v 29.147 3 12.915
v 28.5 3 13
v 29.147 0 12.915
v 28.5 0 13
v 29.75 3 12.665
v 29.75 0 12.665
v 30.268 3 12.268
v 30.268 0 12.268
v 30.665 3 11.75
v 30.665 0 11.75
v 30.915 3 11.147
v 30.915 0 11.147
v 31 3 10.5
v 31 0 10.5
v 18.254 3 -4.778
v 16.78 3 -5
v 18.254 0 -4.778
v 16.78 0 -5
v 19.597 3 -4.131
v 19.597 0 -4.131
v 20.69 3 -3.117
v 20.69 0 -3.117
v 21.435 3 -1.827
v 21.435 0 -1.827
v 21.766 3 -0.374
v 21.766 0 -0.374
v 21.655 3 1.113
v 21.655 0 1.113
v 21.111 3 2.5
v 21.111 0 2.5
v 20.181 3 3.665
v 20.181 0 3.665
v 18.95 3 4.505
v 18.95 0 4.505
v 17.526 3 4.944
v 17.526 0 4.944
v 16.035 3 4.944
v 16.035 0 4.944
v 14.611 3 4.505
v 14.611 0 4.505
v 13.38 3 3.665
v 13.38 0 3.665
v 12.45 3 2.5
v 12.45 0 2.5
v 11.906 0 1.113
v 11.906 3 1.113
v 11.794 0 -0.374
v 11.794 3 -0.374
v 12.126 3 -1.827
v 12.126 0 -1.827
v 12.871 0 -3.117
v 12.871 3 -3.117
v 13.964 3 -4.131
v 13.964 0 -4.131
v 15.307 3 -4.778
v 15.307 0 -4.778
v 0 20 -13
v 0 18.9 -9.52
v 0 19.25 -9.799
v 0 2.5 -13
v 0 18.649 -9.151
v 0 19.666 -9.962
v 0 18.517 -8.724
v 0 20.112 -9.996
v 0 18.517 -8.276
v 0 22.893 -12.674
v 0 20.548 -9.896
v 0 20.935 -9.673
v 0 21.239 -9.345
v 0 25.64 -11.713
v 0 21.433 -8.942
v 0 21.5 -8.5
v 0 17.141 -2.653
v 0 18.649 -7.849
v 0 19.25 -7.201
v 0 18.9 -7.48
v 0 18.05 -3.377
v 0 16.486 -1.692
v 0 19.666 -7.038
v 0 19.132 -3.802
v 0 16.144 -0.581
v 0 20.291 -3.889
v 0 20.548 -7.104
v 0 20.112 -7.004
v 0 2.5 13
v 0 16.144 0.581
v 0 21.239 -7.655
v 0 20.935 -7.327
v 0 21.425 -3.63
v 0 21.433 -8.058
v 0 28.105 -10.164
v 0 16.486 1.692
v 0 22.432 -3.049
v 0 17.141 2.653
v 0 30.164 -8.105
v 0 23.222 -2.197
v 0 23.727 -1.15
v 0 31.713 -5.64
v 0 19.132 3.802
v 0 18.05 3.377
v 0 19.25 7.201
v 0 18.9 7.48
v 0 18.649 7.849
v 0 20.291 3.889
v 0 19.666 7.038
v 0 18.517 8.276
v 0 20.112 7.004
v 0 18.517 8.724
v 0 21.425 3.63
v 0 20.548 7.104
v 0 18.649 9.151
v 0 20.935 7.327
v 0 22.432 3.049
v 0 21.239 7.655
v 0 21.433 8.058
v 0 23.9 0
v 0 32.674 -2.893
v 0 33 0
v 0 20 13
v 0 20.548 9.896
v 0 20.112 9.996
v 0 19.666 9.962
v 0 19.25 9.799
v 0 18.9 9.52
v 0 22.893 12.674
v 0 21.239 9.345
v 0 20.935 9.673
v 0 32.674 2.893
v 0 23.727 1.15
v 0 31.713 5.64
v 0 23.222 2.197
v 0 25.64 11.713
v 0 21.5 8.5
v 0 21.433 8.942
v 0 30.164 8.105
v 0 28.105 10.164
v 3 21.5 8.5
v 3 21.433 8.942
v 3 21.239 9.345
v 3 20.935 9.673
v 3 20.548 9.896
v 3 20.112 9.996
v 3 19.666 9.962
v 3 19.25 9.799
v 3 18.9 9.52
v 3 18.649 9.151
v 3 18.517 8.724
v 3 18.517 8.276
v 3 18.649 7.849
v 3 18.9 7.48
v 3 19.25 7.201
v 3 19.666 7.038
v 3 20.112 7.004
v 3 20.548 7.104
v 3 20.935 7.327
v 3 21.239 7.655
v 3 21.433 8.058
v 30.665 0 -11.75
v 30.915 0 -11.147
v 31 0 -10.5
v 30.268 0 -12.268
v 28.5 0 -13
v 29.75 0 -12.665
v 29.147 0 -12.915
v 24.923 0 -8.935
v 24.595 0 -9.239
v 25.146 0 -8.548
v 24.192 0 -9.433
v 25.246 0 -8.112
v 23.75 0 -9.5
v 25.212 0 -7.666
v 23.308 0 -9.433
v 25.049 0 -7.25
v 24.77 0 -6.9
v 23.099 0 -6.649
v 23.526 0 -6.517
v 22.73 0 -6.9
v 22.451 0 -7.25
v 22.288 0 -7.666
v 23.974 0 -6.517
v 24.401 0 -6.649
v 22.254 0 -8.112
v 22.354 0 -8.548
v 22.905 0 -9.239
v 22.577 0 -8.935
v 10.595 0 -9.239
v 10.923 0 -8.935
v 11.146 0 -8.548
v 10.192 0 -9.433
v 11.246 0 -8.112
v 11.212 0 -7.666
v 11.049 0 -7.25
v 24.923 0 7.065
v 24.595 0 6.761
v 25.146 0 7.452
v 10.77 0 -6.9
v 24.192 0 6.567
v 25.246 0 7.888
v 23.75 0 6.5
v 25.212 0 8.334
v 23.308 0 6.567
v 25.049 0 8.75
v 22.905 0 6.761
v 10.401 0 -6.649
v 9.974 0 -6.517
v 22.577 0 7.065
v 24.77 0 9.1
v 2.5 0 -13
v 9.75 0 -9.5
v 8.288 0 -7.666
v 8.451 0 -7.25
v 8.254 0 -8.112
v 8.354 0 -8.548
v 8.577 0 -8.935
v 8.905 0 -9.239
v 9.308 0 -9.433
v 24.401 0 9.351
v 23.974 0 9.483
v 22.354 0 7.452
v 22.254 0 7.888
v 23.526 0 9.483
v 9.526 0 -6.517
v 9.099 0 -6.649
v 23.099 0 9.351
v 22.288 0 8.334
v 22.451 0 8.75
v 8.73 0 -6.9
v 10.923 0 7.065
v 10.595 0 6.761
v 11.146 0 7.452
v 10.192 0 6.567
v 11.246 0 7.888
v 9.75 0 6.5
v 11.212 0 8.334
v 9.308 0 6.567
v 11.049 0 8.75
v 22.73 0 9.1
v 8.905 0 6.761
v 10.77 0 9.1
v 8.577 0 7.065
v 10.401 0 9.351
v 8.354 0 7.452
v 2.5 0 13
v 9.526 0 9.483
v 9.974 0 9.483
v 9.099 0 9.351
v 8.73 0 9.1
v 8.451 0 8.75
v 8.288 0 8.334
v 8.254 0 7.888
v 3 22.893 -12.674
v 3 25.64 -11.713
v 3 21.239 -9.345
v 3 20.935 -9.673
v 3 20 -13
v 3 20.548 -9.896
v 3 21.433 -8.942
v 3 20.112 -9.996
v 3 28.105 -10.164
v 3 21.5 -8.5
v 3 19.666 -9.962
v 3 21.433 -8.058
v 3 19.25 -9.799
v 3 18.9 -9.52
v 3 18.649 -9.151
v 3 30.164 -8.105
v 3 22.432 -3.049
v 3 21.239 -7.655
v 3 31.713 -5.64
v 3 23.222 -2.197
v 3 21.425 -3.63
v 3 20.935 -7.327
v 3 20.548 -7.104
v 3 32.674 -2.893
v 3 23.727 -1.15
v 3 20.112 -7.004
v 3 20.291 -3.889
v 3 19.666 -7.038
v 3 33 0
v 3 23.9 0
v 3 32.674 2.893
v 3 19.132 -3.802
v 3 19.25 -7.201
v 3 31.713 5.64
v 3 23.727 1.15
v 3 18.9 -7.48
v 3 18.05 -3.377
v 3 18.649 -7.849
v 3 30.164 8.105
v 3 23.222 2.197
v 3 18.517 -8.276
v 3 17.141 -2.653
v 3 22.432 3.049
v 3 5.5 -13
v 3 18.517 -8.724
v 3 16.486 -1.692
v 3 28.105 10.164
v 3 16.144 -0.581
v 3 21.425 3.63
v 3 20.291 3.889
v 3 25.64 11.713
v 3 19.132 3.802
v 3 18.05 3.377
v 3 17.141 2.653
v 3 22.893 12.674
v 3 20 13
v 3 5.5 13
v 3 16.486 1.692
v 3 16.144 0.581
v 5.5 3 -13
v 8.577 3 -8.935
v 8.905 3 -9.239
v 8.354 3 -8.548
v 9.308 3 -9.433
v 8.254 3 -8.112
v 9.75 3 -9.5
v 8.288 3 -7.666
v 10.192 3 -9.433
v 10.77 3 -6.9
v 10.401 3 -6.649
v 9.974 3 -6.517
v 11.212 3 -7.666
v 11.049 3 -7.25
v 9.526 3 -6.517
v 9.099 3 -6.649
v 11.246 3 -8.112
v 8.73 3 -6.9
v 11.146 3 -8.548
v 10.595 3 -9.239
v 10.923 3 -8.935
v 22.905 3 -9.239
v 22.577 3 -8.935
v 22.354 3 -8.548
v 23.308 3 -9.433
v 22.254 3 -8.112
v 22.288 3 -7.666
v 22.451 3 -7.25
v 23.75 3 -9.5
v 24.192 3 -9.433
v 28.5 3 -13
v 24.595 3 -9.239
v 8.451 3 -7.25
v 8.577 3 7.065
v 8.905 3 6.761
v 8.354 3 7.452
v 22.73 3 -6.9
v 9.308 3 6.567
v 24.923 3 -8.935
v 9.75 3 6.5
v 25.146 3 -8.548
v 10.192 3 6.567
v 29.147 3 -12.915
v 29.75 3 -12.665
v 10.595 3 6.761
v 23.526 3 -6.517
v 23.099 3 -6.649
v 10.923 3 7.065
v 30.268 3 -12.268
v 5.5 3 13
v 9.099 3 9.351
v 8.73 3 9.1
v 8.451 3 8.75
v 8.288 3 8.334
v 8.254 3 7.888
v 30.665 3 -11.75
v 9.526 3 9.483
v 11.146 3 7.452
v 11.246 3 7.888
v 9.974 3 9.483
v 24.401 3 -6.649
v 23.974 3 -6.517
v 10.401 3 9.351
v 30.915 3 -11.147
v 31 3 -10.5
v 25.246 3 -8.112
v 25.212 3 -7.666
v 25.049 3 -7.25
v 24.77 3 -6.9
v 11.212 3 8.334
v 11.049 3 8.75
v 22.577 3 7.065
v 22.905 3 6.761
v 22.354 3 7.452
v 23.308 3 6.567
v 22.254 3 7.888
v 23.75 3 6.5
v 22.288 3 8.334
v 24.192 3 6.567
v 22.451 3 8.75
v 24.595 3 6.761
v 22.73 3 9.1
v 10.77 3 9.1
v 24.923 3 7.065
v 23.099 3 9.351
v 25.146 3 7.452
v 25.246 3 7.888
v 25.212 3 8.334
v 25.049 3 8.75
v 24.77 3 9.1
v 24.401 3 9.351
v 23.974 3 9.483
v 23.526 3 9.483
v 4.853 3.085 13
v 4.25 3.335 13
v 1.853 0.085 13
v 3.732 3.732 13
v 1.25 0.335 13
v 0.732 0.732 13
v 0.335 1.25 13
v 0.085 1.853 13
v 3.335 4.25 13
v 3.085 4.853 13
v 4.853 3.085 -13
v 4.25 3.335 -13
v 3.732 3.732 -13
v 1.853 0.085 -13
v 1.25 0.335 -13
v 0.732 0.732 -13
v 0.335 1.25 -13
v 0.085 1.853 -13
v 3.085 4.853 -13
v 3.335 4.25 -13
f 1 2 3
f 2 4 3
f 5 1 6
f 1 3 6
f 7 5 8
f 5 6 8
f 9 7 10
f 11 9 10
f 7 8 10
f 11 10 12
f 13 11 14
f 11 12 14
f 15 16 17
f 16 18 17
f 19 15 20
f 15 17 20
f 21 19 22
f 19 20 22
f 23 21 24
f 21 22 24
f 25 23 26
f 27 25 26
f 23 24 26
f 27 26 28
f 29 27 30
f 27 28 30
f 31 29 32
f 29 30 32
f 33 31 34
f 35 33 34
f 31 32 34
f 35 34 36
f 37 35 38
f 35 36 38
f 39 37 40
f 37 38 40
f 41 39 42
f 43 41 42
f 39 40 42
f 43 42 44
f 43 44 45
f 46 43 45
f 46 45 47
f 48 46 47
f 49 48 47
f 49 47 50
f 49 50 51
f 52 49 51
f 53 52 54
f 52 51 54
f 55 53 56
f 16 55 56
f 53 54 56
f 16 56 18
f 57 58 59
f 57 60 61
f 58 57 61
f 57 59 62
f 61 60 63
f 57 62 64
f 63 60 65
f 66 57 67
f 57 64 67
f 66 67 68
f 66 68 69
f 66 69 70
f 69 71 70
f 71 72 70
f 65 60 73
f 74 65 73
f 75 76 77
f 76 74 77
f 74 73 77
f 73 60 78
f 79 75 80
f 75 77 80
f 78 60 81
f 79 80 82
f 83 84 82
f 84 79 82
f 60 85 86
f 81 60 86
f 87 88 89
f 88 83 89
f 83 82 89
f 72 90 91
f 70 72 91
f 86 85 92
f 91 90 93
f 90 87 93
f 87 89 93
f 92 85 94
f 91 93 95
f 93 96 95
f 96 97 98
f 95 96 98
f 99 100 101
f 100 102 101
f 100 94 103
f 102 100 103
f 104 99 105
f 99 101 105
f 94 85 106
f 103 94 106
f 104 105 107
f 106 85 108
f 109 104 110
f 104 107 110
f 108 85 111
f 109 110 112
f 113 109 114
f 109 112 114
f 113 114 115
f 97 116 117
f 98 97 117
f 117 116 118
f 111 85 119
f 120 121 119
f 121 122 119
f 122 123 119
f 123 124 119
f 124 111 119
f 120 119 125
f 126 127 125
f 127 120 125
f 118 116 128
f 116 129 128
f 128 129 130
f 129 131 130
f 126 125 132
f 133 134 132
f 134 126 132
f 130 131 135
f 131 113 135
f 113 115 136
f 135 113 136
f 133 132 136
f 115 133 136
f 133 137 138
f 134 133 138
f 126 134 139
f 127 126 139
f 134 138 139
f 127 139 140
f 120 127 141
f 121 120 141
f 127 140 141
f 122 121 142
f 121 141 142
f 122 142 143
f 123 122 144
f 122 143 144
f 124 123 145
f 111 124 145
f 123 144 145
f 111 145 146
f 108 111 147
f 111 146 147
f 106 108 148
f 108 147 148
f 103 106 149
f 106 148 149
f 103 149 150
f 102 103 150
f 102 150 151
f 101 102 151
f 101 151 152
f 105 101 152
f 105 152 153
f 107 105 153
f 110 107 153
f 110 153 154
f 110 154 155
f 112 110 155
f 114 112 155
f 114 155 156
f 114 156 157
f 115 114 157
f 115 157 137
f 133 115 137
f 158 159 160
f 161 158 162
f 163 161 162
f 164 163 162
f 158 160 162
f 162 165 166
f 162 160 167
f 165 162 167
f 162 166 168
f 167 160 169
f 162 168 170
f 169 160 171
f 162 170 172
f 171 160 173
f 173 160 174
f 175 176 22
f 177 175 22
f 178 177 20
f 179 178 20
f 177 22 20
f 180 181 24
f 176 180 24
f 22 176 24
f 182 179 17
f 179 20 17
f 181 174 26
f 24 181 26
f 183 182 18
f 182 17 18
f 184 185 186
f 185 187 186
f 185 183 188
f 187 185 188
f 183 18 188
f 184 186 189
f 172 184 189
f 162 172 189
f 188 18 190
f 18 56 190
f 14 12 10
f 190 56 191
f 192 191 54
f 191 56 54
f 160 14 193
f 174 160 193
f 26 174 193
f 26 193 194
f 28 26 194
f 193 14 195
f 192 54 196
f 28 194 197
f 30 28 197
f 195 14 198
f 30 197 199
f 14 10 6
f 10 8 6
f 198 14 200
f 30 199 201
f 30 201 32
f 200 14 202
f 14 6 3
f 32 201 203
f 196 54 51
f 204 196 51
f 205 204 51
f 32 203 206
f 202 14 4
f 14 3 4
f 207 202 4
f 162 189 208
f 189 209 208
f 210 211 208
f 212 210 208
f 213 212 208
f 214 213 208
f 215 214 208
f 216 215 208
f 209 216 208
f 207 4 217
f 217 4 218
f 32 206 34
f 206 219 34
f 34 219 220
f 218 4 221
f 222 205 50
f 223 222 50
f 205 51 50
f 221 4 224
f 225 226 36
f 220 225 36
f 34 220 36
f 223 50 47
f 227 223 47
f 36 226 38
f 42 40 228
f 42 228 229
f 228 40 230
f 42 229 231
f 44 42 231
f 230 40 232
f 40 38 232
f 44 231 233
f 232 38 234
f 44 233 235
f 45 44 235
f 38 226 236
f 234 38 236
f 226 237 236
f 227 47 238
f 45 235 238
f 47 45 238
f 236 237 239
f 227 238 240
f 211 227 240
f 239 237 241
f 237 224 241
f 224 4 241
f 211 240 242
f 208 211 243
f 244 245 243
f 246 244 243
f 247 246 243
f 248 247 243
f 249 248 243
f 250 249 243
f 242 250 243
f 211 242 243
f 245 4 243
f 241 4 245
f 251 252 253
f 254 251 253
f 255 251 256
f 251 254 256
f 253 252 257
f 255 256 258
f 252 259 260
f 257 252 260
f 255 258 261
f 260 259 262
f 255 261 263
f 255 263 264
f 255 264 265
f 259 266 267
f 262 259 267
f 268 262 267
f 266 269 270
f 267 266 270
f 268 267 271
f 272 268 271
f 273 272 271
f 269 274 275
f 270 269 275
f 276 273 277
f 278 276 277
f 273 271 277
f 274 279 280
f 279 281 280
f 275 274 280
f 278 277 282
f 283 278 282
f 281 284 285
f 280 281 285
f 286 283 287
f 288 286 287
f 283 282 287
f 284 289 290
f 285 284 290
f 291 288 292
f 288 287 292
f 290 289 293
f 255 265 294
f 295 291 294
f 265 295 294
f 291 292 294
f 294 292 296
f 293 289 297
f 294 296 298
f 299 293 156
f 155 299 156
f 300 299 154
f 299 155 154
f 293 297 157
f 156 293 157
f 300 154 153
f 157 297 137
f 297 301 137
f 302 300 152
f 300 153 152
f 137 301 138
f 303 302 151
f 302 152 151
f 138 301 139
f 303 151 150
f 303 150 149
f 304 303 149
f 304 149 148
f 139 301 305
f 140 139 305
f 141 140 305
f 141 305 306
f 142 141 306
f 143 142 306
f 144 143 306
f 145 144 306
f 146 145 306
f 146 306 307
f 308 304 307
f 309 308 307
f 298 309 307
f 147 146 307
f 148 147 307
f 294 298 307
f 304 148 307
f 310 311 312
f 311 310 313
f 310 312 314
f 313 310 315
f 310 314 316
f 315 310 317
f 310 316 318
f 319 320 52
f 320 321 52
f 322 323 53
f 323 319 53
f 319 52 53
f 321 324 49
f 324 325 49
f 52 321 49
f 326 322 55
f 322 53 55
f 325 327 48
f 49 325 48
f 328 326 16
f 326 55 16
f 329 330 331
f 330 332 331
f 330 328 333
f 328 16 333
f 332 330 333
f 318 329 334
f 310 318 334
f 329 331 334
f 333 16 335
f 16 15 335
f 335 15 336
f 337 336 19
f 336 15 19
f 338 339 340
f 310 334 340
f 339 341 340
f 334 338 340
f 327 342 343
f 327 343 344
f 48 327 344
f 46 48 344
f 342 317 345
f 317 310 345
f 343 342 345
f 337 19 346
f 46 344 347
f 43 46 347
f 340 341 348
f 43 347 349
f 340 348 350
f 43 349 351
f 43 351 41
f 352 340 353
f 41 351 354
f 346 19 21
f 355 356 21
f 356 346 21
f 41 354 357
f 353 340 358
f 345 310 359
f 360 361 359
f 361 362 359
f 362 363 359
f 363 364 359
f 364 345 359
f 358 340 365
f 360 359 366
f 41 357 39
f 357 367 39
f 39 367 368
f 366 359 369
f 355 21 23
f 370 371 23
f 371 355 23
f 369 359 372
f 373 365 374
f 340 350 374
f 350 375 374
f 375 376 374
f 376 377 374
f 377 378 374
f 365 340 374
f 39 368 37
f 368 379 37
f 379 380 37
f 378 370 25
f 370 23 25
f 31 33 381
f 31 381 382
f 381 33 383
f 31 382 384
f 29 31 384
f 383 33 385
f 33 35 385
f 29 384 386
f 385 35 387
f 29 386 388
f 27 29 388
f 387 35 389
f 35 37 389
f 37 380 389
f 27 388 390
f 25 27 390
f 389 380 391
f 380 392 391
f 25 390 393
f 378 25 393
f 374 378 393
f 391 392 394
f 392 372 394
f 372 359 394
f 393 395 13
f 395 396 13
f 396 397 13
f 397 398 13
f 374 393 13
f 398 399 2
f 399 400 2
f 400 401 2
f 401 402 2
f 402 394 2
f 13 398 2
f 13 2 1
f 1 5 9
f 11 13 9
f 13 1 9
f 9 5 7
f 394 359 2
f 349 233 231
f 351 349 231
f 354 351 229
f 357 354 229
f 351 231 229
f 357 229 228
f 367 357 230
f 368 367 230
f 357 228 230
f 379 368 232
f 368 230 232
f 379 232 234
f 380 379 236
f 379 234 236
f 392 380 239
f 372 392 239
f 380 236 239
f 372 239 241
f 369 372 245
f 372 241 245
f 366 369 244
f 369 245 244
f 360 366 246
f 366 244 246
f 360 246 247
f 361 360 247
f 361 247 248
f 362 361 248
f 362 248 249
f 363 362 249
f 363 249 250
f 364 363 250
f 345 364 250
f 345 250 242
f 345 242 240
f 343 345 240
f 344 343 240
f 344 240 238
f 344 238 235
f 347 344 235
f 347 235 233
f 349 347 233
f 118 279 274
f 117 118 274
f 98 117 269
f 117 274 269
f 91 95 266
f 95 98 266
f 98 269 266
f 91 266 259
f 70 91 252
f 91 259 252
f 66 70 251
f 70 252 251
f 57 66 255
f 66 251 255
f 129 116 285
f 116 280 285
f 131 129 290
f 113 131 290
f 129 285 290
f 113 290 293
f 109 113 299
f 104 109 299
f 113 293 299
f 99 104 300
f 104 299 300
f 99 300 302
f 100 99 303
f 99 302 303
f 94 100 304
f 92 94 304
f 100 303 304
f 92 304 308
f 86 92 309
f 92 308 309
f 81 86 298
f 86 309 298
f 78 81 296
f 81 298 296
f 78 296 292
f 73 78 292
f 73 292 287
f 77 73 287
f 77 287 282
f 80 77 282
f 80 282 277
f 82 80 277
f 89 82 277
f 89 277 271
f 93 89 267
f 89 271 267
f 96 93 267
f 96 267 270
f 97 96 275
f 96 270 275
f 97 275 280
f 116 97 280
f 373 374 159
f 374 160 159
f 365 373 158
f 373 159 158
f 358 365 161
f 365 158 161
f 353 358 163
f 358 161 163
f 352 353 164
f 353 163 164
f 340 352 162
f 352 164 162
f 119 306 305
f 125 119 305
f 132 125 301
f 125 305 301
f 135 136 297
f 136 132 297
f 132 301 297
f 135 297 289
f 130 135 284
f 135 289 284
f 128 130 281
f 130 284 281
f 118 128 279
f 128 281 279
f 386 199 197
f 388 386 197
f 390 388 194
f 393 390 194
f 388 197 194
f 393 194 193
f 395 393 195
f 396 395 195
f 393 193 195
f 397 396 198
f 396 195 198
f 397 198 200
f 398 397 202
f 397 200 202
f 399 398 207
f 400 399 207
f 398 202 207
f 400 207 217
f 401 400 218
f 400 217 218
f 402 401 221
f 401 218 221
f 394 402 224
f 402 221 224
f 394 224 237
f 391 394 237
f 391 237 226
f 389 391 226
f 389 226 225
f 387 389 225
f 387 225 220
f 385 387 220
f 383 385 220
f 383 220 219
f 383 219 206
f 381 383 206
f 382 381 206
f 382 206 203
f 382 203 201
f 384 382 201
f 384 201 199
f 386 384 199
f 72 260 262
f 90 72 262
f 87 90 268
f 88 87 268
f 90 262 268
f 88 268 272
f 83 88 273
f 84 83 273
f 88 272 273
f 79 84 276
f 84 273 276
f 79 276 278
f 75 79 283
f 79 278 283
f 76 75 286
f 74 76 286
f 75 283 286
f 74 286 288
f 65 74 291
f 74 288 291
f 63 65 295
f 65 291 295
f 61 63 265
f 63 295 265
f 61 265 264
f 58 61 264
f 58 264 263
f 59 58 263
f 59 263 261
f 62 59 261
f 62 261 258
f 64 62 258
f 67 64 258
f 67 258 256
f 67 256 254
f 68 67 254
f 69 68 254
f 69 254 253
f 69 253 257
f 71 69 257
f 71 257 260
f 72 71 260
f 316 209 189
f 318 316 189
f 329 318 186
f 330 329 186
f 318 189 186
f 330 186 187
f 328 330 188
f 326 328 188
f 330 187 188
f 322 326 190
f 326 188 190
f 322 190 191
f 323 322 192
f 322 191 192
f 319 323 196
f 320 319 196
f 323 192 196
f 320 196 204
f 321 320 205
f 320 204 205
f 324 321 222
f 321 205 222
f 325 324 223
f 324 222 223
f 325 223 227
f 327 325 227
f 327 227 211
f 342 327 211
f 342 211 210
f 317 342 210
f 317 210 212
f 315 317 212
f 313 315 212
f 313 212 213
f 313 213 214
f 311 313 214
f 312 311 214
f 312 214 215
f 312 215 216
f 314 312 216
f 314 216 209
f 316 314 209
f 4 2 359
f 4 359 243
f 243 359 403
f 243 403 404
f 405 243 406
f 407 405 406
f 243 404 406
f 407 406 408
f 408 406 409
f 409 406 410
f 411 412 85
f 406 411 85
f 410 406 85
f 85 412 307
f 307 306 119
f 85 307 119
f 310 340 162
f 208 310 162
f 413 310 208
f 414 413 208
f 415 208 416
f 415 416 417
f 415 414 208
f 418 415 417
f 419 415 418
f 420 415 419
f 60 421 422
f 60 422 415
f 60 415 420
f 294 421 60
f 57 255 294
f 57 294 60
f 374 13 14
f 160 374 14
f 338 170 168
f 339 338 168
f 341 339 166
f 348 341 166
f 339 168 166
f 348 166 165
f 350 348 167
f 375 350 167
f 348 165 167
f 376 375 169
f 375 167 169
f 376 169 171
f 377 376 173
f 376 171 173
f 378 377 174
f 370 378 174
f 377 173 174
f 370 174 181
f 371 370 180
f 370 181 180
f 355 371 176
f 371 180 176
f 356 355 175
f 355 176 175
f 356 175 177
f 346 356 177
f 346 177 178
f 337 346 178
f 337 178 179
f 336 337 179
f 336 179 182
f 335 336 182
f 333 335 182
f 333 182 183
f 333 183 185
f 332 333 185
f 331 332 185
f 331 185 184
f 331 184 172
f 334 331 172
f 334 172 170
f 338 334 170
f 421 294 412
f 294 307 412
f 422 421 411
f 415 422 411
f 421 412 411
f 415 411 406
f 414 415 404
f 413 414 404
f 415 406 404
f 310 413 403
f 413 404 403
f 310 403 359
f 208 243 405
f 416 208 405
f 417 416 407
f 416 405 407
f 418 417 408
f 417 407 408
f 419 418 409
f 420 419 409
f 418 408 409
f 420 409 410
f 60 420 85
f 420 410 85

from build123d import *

# Parameters (mm, degrees)
BOSS_EXTRUDE2_DEPTH = 13
FILLET1_R           = 2.5
CUT_EXTRUDE1_DEPTH  = 13
SKETCH4_R           = 1.5
SKETCH4_R_2         = 3.9
CUT_EXTRUDE2_DEPTH  = 13
SKETCH5_R           = 1.5
SKETCH5_R_2         = 5
CUT_EXTRUDE3_DEPTH  = 13


with BuildPart() as part:
    # Sketch1 → Boss-Extrude2 (new, symmetric)
    with BuildSketch(Plane.XY):
        with BuildLine():
            Line((0, 2.5), (0, 33))
            Line((0, 33), (3, 33))
            Line((3, 33), (3, 5.5))
            ThreePointArc((3, 5.5), (3.732233047, 3.732233047), (5.5, 3))
            Line((5.5, 3), (31, 3))
            Line((31, 3), (31, 0))
            Line((31, 0), (2.5, 0))
            ThreePointArc((2.5, 0), (0.732233047, 0.732233047), (0, 2.5))
        make_face()
    extrude(amount=BOSS_EXTRUDE2_DEPTH, both=True)

    # Fillet1
    fillet1_edges = [part.edges().sort_by_distance(p)[0] for p in [
        (31, 1.5, 13),
        (31, 1.5, -13),
    ]]
    fillet(fillet1_edges, radius=FILLET1_R)

    # Sketch3 → Cut-Extrude1 (cut, symmetric)
    with BuildSketch(Plane(origin=(3, 0, 0), x_dir=(0, 0, -1), z_dir=(1, 0, 0))):
        with BuildLine():
            Line((-13, 33), (-13, 20))
            ThreePointArc((-13, 20), (-9.192388155, 29.192388155), (0, 33))
            Line((0, 33), (-13, 33))
        make_face()
        with BuildLine():
            Line((13, 33), (0, 33))
            ThreePointArc((0, 33), (9.192388155, 29.192388155), (13, 20))
            Line((13, 20), (13, 33))
        make_face()
    extrude(amount=CUT_EXTRUDE1_DEPTH, both=True, mode=Mode.SUBTRACT)

    # Sketch4 → Cut-Extrude2 (cut, symmetric)
    with BuildSketch(Plane(origin=(3, 0, 0), x_dir=(0, 0, -1), z_dir=(1, 0, 0))):
        with Locations(Location((-8.5, 20, 0), (0, 0, 90))):
            Circle(SKETCH4_R)
        with Locations(Location((8.5, 20, 0), (0, 0, 90))):
            Circle(SKETCH4_R)
        with Locations(Location((0, 20, 0), (0, 0, 90))):
            Circle(SKETCH4_R_2)
    extrude(amount=CUT_EXTRUDE2_DEPTH, both=True, mode=Mode.SUBTRACT)

    # Sketch5 → Cut-Extrude3 (cut, symmetric)
    with BuildSketch(Plane.XZ):
        with Locations(Location((23.75, 8, 0), (0, 0, 270))):
            Circle(SKETCH5_R)
        with Locations(Location((23.75, -8, 0), (0, 0, 270))):
            Circle(SKETCH5_R)
        with Locations(Location((9.75, 8, 0), (0, 0, 270))):
            Circle(SKETCH5_R)
        with Locations(Location((9.75, -8, 0), (0, 0, 270))):
            Circle(SKETCH5_R)
        with Locations(Location((16.780453702, 0, 0), (0, 0, 270))):
            Circle(SKETCH5_R_2)
    extrude(amount=CUT_EXTRUDE3_DEPTH, both=True, mode=Mode.SUBTRACT)


solid = part.part
